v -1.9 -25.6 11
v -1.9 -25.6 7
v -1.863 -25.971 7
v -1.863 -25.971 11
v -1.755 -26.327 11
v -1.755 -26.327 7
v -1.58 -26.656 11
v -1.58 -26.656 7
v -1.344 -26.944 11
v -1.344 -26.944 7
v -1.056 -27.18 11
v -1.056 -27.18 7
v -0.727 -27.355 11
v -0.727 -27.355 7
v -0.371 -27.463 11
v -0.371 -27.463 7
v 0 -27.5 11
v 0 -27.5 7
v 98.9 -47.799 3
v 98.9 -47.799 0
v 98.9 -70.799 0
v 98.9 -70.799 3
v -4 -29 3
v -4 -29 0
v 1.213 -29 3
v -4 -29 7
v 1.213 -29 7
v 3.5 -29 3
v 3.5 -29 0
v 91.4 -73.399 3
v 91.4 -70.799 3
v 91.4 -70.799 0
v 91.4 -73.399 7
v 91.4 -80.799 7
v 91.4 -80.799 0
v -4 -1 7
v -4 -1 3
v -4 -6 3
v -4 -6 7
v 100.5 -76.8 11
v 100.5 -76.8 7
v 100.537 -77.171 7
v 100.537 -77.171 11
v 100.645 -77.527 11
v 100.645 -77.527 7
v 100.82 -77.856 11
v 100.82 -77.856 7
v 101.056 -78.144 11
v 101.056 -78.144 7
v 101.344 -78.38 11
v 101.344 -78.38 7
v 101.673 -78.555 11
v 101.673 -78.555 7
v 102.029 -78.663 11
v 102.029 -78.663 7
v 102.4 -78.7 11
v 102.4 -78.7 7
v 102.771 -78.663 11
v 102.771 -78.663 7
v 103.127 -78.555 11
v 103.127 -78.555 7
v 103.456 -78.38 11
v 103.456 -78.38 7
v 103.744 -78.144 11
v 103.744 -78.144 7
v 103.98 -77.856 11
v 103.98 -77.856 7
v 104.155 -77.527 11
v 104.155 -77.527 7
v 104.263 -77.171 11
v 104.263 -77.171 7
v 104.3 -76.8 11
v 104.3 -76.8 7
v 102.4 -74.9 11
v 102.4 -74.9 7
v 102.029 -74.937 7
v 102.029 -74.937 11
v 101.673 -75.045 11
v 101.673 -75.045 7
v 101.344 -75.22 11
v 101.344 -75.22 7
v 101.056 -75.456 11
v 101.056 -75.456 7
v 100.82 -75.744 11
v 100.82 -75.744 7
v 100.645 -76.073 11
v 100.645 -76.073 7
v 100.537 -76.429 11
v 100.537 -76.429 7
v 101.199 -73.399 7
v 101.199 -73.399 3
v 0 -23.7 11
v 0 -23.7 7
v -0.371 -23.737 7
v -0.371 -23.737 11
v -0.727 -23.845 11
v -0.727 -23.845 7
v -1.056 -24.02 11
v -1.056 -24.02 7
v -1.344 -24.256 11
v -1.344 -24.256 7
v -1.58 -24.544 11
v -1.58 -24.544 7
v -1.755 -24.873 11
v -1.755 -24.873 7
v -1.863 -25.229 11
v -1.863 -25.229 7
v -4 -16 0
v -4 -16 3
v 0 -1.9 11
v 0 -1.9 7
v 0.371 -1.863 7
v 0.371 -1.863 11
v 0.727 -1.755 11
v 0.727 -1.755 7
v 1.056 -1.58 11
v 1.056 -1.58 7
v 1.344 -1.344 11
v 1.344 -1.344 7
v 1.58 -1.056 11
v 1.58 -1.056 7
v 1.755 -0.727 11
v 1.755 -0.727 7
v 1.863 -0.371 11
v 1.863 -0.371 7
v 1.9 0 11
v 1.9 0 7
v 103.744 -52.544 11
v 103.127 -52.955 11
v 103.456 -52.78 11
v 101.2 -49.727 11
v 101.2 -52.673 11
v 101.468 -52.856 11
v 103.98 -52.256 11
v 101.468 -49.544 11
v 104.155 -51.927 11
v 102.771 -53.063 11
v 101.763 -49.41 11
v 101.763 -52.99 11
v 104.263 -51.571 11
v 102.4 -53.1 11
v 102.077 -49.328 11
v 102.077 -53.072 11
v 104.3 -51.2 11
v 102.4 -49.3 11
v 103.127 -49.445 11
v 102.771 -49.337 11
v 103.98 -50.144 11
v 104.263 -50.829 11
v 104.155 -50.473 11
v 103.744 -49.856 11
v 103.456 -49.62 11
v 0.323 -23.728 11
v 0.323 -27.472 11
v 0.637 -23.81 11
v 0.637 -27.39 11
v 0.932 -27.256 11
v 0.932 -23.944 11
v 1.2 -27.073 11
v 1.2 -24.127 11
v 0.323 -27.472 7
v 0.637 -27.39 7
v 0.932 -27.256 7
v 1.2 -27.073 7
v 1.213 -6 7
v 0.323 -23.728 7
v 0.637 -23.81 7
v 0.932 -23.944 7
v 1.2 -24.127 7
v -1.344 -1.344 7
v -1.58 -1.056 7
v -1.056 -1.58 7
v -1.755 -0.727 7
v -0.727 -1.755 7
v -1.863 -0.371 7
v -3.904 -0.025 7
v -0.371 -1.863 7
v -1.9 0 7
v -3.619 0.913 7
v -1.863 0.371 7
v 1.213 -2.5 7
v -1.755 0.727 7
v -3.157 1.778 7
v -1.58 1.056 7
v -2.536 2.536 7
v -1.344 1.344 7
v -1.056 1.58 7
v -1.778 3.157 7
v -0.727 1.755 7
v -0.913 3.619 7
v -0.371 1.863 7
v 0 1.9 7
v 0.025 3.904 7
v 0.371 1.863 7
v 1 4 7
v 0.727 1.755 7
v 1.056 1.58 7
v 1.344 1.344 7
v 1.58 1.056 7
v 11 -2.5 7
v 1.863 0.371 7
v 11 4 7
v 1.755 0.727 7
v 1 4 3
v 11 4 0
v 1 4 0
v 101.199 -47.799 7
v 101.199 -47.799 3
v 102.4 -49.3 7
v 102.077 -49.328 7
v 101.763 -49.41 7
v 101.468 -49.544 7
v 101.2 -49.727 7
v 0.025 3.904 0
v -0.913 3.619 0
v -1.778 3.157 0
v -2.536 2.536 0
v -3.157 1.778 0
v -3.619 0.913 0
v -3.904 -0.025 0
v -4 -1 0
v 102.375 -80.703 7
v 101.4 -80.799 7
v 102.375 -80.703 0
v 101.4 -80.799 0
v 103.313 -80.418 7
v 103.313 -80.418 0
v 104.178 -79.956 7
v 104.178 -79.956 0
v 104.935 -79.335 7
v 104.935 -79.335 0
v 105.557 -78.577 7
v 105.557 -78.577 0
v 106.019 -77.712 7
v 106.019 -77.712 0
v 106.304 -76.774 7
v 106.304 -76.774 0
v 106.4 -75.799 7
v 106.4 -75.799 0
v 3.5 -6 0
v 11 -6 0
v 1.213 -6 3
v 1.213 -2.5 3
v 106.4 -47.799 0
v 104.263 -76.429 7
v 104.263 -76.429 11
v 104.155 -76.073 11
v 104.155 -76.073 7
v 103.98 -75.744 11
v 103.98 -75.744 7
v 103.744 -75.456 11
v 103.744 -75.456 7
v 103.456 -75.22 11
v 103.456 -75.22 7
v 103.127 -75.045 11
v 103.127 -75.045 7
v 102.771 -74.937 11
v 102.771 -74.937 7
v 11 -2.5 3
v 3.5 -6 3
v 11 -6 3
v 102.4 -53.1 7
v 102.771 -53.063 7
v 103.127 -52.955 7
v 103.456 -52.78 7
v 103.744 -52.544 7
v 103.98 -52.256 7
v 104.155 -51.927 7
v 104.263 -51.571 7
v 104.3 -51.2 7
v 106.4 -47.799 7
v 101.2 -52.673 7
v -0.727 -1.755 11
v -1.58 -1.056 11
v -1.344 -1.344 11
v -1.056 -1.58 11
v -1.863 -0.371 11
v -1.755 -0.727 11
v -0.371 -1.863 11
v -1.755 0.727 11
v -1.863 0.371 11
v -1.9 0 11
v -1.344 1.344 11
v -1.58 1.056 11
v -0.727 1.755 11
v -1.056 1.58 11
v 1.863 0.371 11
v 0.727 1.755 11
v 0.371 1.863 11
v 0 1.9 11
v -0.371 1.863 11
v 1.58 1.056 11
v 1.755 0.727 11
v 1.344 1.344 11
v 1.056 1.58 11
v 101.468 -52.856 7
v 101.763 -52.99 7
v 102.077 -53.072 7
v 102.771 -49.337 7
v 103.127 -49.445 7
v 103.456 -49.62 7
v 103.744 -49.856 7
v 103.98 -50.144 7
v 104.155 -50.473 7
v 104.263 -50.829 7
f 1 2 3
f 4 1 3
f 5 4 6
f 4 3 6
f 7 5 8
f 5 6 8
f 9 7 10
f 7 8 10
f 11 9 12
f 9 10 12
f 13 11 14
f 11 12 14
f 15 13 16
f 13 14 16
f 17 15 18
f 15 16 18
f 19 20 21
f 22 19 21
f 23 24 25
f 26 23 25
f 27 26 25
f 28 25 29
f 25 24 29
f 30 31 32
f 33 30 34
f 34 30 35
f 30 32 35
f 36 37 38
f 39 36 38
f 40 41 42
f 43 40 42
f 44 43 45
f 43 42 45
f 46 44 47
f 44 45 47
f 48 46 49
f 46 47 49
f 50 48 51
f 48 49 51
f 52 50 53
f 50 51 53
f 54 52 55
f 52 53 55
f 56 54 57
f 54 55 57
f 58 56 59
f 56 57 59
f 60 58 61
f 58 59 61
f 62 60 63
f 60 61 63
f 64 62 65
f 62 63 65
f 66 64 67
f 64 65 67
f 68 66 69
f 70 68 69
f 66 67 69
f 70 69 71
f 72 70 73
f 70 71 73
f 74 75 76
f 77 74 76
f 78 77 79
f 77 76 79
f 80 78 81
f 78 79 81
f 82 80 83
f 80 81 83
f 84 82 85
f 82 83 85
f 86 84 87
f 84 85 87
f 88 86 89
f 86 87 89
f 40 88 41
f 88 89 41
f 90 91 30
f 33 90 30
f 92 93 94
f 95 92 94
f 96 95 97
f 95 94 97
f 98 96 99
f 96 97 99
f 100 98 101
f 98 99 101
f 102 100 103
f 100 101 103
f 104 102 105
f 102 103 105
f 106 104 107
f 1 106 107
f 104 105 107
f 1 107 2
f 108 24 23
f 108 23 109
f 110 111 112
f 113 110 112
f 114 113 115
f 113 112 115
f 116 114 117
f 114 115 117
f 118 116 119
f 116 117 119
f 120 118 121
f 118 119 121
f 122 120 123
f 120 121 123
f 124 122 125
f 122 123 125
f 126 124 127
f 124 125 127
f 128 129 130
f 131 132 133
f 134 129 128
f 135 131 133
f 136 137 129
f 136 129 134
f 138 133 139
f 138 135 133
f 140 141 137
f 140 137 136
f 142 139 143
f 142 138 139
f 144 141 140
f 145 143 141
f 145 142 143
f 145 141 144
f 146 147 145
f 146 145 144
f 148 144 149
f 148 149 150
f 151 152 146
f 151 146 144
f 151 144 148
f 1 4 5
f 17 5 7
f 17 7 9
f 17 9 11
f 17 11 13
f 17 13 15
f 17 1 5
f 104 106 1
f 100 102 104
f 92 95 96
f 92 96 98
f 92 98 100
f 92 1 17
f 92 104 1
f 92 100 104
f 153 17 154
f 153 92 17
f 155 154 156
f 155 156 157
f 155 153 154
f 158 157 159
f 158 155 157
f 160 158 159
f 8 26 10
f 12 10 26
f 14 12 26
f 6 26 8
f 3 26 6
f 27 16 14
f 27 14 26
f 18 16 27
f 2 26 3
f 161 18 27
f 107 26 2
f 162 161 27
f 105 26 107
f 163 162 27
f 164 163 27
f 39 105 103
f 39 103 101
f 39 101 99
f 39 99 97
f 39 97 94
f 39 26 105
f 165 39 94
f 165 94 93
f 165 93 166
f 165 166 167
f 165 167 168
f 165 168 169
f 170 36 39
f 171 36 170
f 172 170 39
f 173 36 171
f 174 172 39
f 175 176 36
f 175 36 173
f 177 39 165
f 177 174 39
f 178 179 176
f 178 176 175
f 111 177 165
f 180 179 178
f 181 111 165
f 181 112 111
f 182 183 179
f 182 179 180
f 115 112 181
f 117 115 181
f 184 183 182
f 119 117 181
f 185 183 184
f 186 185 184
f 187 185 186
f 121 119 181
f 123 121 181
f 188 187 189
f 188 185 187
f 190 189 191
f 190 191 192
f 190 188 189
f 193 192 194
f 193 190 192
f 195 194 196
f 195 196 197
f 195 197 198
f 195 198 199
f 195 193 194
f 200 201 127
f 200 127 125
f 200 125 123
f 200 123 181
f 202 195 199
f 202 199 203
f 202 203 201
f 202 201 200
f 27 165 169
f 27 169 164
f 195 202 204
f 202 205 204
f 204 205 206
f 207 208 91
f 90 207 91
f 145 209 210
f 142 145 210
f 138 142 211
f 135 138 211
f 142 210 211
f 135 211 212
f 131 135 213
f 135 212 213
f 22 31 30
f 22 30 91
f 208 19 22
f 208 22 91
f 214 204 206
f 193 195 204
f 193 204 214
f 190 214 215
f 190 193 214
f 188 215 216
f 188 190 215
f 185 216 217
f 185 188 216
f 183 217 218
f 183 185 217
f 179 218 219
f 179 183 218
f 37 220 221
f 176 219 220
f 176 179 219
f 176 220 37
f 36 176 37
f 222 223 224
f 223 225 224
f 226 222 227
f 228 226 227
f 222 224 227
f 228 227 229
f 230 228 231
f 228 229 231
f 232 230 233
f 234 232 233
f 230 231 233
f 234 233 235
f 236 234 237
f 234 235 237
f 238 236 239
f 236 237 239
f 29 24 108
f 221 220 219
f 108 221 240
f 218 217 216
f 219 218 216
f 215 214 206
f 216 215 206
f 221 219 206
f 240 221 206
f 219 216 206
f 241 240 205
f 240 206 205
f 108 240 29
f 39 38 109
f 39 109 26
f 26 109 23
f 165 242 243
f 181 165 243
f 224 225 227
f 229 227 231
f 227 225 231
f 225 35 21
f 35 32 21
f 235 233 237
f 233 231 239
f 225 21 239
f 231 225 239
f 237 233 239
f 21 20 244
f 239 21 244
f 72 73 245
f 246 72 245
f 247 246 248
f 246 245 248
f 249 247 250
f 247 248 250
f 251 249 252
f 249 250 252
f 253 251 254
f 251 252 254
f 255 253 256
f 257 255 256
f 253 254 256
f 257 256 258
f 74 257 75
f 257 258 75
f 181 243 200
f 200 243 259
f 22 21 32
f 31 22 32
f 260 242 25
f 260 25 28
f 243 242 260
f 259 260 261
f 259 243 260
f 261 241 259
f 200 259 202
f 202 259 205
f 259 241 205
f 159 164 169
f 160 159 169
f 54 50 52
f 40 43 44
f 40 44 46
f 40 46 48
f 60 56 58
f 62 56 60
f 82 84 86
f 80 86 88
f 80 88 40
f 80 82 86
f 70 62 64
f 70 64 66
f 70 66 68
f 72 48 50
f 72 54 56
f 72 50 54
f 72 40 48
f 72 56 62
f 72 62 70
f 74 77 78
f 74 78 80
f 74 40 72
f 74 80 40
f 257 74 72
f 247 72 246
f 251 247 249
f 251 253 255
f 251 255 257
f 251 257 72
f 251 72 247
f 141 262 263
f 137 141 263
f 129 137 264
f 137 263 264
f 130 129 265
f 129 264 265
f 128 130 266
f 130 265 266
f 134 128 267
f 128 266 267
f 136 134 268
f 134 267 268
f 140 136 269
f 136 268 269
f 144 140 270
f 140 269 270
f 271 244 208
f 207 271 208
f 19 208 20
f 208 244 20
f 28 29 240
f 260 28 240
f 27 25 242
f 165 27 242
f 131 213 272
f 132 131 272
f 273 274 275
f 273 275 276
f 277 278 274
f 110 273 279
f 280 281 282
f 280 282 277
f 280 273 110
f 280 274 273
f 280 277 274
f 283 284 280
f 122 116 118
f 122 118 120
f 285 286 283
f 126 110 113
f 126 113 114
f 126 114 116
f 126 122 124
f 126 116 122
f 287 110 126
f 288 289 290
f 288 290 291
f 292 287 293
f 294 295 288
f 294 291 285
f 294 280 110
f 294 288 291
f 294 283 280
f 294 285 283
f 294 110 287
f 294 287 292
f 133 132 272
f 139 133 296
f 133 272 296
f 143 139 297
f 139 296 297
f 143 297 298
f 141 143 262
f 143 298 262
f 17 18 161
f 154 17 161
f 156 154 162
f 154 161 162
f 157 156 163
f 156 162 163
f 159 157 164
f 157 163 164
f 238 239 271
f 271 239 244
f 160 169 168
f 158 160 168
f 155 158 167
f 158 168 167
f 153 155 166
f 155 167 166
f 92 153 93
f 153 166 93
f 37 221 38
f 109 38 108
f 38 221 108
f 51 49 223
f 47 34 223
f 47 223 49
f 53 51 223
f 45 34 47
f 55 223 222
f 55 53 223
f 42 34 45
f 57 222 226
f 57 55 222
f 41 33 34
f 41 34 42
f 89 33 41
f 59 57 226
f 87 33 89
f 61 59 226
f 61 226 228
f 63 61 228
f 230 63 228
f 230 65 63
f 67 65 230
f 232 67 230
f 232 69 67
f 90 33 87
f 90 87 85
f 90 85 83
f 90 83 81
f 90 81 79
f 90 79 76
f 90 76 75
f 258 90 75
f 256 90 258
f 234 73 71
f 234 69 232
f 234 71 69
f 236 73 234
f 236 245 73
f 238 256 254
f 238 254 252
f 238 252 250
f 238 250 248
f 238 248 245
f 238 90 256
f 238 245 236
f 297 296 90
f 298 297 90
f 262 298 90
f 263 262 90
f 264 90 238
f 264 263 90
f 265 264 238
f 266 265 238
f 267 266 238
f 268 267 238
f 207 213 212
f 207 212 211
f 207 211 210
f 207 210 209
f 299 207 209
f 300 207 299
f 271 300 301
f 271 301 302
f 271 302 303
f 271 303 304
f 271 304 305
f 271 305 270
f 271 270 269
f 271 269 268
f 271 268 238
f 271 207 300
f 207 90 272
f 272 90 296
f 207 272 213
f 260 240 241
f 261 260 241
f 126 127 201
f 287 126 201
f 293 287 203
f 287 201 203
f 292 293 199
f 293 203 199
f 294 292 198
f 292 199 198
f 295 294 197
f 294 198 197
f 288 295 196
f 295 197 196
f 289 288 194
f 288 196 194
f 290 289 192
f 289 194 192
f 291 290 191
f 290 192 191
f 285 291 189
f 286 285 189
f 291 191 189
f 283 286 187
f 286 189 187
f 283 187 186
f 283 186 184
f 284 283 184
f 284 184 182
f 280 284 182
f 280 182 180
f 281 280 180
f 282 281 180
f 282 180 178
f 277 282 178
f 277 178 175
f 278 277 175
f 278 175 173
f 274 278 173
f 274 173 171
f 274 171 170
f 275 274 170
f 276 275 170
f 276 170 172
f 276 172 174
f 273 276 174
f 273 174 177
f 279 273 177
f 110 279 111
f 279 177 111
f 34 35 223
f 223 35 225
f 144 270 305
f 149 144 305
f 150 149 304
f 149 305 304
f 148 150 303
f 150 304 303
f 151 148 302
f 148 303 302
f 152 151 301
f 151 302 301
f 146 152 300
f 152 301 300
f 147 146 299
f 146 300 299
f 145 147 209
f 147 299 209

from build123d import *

# Parameters (mm, degrees)
F1_W     = 7.5
F1_H     = 6.5
F1_W_2   = 5.2125635985
F1_H_2   = 10
F1_W_3   = 2.2874364015
F1_H_3   = 13
F2_DEPTH = 3
F1_W_4   = 5.20036304
F1_W_5   = 2.29963696
F3_DEPTH = 7
F4_DEPTH = 11
F5_R     = 5
F5_2_R   = 5


with BuildPart() as f2:
    # F1 (on Top) → F2 (new body)
    with BuildSketch(Plane.XY):
        Polygon((3.5, 4), (0, 4), (-4, 4), (-4, -6), (1.2125635985, -6), (1.2125635985, -3.4049407113), (1.2125635985, -2.5), (3.5, -2.5), align=None)
        with Locations((7.25, 0.75)):
            Rectangle(F1_W, F1_H)
        with Locations((-1.3937182007, -11)):
            Rectangle(F1_W_2, F1_H_2)
        Polygon((11, -2.5), (3.5, -2.5), (1.2125635985, -2.5), (1.2125635985, -3.4049407113), (1.2125635985, -6), (3.5, -6), (11, -6), align=None)
        with Locations((2.3562817993, -11)):
            Rectangle(F1_W_3, F1_H_2)
        with Locations((-1.3937182007, -22.5)):
            Rectangle(F1_W_2, F1_H_3)
        with Locations((2.3562817993, -22.5)):
            Rectangle(F1_W_3, F1_H_3)
    extrude(amount=F2_DEPTH)

    # F1 (on Top) → F3 (join)
    with BuildSketch(Plane.XY):
        with Locations((-1.3937182007, -11)):
            Rectangle(F1_W_2, F1_H_2)
        with Locations((7.25, 0.75)):
            Rectangle(F1_W, F1_H)
        Polygon((3.5, 4), (0, 4), (-4, 4), (-4, -6), (1.2125635985, -6), (1.2125635985, -3.4049407113), (1.2125635985, -2.5), (3.5, -2.5), align=None)
        with Locations((-1.3937182007, -22.5)):
            Rectangle(F1_W_2, F1_H_3)
    extrude(amount=F3_DEPTH)

    # F0 (on Top) → F4, piece 2 (join)
    with BuildSketch(Plane.XY):
        with BuildLine():
            ThreePointArc((0, -1.9), (1.3435028843, -1.3435028843), (1.9, 0))
            ThreePointArc((1.9, 0), (-1.3435028843, 1.3435028843), (0, -1.9))
        make_face()
        with BuildLine():
            ThreePointArc((1.2, -24.1269080137), (0.6368379802, -23.8099057603), (0, -23.7))
            Line((0, -23.7), (0, -25.6))
            Line((0, -25.6), (0, -27.5))
            ThreePointArc((0, -27.5), (0.6368379802, -27.3900942397), (1.2, -27.0730919863))
            Line((1.2, -27.0730919863), (1.2, -24.1269080137))
        make_face()
        with BuildLine():
            Line((0, -25.6), (0, -23.7))
            ThreePointArc((0, -23.7), (-1.3435028843, -24.2564971157), (-1.9, -25.6))
            Line((-1.9, -25.6), (0, -25.6))
        make_face()
        with BuildLine():
            Line((0, -27.5), (0, -25.6))
            Line((0, -25.6), (-1.9, -25.6))
            ThreePointArc((-1.9, -25.6), (-1.3435028843, -26.9435028843), (0, -27.5))
        make_face()
    extrude(amount=F4_DEPTH)

    # F5
    f5_edges = [f2.edges().sort_by_distance(p)[0] for p in [
        (-4, 4, 3.5),
    ]]
    fillet(f5_edges, radius=F5_R)


with BuildPart() as f2b:
    # F1 (on Top) → F2, piece 2 (new body)
    with BuildSketch(Plane.XY):
        Polygon((106.3998335004, -80.7989978194), (106.3998335004, -76.7989978194), (106.3998335004, -70.7989978194), (106.3998335004, -60.7989978194), (101.1994704604, -60.7989978194), (101.1994704604, -70.7989978194), (101.1994704604, -73.3985826373), (98.8998335004, -73.3985826373), (91.3998335004, -73.3985826373), (91.3998335004, -80.7989978194), (98.8998335004, -80.7989978194), align=None)
        with Locations((103.7996519804, -54.2989978194)):
            Rectangle(F1_W_4, F1_H_3)
        Polygon((101.1994704604, -70.7989978194), (101.1994704604, -60.7989978194), (98.8998335004, -60.7989978194), (98.8998335004, -70.7989978194), (91.3998335004, -70.7989978194), (91.3998335004, -73.3985826373), (98.8998335004, -73.3985826373), (101.1994704604, -73.3985826373), align=None)
        with Locations((100.0496519804, -54.2989978194)):
            Rectangle(F1_W_5, F1_H_3)
    extrude(amount=F2_DEPTH)

    # F1 (on Top) → F3, piece 2 (join)
    with BuildSketch(Plane.XY):
        Polygon((106.3998335004, -80.7989978194), (106.3998335004, -76.7989978194), (106.3998335004, -70.7989978194), (106.3998335004, -60.7989978194), (101.1994704604, -60.7989978194), (101.1994704604, -70.7989978194), (101.1994704604, -73.3985826373), (98.8998335004, -73.3985826373), (91.3998335004, -73.3985826373), (91.3998335004, -80.7989978194), (98.8998335004, -80.7989978194), align=None)
        with Locations((103.7996519804, -54.2989978194)):
            Rectangle(F1_W_4, F1_H_3)
    extrude(amount=F3_DEPTH)

    # F0 (on Top) → F4 (join)
    with BuildSketch(Plane.XY):
        with BuildLine():
            ThreePointArc((104.3, -76.8), (103.7435028843, -75.4564971157), (102.4, -74.9))
            ThreePointArc((102.4, -74.9), (101.0564971157, -75.4564971157), (100.5, -76.8))
            ThreePointArc((100.5, -76.8), (102.4, -78.7), (104.3, -76.8))
        make_face()
        with BuildLine():
            ThreePointArc((104.3, -51.2), (103.7435028843, -49.8564971157), (102.4, -49.3))
            Line((102.4, -49.3), (102.4, -53.1))
            ThreePointArc((102.4, -53.1), (103.7435028843, -52.5435028843), (104.3, -51.2))
        make_face()
        with BuildLine():
            ThreePointArc((102.4, -49.3), (101.7631620198, -49.4099057603), (101.2, -49.7269080137))
            Line((101.2, -49.7269080137), (101.2, -52.6730919863))
            ThreePointArc((101.2, -52.6730919863), (101.7631620198, -52.9900942397), (102.4, -53.1))
            Line((102.4, -53.1), (102.4, -49.3))
        make_face()
    extrude(amount=F4_DEPTH)

    # F5#2
    f5_2_edges = [f2b.edges().sort_by_distance(p)[0] for p in [
        (106.399834, -80.798998, 3.5),
    ]]
    fillet(f5_2_edges, radius=F5_2_R)


solid = Compound([f2.part, f2b.part])
